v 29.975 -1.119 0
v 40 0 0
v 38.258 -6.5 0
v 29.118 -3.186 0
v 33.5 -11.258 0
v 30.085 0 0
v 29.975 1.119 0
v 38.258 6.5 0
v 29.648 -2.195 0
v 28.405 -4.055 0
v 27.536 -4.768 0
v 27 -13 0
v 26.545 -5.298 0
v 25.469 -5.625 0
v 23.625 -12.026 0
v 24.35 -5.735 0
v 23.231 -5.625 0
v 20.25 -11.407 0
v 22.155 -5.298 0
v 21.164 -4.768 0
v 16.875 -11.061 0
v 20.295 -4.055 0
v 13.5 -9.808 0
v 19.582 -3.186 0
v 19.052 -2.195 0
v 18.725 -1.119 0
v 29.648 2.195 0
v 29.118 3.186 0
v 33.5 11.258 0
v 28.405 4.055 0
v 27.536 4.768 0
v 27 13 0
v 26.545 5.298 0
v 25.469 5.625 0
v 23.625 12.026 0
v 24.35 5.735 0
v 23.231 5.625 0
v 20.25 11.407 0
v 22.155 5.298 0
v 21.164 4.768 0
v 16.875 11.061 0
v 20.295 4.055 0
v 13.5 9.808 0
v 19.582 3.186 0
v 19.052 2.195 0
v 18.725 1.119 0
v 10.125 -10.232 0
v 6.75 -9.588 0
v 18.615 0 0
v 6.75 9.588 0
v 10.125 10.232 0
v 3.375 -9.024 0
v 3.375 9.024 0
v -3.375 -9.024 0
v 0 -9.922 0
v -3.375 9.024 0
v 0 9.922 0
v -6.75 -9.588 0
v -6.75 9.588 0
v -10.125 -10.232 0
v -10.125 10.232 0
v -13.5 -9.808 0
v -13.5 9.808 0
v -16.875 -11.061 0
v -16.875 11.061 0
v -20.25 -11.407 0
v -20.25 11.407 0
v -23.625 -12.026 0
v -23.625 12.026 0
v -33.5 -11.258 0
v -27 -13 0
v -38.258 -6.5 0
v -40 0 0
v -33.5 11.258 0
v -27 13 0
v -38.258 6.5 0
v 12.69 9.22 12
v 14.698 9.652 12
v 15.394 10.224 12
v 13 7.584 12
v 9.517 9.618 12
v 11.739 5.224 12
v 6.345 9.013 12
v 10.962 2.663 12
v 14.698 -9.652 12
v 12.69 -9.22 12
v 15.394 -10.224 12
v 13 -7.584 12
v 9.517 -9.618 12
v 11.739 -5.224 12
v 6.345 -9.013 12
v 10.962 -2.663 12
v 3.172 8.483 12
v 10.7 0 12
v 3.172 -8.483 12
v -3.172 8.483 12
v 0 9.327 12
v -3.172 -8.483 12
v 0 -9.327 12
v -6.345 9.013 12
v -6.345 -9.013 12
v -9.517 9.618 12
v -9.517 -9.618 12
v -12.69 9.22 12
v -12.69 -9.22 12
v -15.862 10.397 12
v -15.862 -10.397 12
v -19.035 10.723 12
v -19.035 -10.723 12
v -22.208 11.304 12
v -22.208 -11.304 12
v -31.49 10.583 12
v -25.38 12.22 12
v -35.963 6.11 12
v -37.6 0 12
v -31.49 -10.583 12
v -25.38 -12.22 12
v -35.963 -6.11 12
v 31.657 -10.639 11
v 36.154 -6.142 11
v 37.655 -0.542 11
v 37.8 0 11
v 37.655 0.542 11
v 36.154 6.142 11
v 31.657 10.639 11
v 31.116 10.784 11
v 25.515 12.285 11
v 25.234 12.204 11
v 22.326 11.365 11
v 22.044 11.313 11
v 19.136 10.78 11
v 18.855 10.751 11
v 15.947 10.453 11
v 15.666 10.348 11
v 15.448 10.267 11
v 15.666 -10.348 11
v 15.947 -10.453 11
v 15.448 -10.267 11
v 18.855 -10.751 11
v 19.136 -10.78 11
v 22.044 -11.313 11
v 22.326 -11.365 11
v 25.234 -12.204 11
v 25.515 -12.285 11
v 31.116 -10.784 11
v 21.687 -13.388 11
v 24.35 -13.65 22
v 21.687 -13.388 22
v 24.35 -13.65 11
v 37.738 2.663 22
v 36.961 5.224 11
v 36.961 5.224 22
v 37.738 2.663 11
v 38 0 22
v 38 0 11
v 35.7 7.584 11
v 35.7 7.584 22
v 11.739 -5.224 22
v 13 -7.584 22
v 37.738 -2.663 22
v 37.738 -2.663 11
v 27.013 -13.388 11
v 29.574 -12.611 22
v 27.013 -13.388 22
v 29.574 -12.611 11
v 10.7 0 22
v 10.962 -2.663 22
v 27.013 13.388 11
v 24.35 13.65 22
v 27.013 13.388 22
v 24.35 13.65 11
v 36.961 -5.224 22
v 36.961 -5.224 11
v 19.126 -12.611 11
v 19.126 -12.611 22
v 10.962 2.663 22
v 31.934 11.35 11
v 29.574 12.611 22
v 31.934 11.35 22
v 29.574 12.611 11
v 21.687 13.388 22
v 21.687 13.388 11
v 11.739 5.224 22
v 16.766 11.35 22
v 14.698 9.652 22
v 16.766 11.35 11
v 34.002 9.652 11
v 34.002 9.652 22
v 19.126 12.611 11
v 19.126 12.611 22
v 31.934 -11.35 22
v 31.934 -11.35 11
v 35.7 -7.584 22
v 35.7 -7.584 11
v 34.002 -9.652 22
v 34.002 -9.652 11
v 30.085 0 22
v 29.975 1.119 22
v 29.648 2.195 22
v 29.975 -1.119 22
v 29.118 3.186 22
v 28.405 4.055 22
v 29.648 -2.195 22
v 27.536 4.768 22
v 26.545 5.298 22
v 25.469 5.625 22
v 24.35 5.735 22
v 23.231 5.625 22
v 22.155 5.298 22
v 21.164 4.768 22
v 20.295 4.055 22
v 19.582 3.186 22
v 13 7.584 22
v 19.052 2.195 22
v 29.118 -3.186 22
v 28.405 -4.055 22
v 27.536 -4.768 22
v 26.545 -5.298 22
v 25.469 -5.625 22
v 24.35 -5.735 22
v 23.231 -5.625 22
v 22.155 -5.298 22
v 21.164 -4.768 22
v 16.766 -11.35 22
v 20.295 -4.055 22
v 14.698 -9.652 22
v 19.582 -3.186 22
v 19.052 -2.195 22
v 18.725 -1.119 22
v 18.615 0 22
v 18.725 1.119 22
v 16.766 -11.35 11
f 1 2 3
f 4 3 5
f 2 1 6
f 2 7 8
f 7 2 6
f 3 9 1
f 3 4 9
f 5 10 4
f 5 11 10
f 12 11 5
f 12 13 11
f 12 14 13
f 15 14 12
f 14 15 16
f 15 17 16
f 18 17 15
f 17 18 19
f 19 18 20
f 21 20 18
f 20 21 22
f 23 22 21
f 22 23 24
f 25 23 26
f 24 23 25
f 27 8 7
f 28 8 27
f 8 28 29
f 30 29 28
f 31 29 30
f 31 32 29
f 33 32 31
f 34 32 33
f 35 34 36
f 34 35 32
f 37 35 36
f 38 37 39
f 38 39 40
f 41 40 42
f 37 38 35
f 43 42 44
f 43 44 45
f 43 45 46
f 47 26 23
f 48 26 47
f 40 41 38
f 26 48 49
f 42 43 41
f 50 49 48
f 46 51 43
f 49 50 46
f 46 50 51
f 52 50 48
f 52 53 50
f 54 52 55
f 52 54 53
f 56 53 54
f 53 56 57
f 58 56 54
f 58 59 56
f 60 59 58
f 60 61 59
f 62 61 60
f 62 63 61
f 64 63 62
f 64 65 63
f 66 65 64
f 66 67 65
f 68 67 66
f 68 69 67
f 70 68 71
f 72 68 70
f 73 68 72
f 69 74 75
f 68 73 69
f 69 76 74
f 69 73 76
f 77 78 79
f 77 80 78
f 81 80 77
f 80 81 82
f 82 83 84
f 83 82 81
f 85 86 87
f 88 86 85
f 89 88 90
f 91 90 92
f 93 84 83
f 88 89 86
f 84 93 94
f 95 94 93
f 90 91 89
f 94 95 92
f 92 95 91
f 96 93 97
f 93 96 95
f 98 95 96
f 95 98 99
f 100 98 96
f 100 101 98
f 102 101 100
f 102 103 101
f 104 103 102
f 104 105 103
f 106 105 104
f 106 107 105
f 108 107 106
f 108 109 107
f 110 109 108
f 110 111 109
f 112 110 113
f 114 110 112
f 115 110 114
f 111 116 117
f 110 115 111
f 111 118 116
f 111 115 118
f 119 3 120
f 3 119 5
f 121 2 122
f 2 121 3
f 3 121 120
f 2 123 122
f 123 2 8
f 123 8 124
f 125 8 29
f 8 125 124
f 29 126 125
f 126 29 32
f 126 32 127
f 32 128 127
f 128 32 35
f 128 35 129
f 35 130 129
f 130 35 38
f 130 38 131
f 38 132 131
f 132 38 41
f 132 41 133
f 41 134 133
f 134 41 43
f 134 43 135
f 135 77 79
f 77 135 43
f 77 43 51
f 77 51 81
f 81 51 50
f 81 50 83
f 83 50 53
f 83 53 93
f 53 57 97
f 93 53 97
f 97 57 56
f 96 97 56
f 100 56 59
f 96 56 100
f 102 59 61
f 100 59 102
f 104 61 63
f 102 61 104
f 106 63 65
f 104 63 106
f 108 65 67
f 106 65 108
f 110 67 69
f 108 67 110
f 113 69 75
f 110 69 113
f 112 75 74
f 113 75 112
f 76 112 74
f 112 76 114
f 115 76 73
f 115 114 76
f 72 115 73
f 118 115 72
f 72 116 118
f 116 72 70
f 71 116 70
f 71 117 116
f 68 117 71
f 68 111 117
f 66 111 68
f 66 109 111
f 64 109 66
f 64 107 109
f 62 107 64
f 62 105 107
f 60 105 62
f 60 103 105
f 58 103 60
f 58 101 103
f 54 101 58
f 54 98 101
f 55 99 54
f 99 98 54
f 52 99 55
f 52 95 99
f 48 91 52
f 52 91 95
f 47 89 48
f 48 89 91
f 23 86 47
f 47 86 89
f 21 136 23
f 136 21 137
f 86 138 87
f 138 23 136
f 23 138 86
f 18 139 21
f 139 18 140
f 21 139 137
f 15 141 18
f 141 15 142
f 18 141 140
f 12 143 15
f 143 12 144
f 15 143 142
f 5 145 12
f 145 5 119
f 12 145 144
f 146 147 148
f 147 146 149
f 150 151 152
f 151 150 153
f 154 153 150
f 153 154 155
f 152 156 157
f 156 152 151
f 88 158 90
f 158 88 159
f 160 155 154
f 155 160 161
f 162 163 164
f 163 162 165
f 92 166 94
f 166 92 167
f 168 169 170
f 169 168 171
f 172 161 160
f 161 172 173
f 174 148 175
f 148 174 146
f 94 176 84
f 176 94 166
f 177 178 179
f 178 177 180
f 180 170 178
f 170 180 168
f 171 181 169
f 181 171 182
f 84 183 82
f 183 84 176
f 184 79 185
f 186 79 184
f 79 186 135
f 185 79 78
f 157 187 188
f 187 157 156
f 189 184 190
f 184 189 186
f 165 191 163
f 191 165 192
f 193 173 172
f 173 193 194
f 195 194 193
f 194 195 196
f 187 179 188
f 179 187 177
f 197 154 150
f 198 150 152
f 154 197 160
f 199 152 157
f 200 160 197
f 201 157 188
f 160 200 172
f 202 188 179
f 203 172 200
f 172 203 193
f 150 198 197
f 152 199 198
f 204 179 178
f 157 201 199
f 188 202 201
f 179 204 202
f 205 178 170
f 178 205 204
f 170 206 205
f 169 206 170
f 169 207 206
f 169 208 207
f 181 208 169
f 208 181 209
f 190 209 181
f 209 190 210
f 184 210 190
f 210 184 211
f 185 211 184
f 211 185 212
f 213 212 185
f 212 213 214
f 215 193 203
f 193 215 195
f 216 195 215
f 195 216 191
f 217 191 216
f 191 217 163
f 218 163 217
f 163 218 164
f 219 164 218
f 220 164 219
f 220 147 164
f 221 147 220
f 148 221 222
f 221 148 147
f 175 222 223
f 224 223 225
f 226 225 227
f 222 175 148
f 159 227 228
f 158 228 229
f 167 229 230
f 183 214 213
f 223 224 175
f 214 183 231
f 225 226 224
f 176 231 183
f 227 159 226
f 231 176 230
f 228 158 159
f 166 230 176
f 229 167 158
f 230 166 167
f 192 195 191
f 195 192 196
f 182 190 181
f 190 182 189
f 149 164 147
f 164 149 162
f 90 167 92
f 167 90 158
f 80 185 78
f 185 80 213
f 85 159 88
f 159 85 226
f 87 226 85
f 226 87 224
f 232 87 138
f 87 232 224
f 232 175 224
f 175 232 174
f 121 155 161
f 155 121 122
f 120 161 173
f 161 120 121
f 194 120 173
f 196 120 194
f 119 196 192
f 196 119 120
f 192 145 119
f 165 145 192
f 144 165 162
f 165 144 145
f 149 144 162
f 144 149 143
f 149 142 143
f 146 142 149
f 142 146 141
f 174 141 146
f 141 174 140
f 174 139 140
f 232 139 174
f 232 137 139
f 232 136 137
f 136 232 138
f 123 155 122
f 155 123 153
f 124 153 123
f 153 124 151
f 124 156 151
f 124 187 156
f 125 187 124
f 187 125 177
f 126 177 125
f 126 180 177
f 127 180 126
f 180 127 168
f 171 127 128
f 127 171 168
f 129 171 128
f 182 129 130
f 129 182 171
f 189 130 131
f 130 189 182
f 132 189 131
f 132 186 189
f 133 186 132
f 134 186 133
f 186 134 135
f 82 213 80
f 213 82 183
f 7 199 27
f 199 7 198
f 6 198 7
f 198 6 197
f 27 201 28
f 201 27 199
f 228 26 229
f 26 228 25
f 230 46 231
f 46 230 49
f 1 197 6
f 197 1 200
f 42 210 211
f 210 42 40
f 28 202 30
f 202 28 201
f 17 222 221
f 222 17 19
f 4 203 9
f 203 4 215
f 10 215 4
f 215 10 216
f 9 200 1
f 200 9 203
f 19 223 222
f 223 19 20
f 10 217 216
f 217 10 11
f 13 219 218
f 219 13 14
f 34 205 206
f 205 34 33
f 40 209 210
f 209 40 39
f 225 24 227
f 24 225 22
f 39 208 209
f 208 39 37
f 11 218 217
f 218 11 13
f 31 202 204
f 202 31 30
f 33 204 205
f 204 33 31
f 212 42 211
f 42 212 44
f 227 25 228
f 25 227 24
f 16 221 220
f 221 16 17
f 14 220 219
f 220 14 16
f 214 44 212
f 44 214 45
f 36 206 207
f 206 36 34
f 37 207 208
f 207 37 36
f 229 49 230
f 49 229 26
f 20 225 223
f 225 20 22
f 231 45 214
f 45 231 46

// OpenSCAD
$fn = 32;

// ----------------------------------------------------------------------
// Handle: 80 x 26 mm grip, 12 mm thick
// ----------------------------------------------------------------------

// --- parameters (mm) ---
length = 80;              // grip length
width = 26;               // grip width
thickness = 12;           // grip thickness
waist = 0.72;             // width factor at the middle
draft = 0.94;             // top face scale of the extrusion
scallops = 6;             // finger rests per side
ripple = 0.06;            // depth factor of the finger rests
boss_d = 27.3;            // mounting boss diameter
boss_h = 10;              // mounting boss height
boss_hole_d = 11.47;      // screw clearance through the boss
boss_r = 24.35;           // boss centre from the grip centre

/* ergonomic grip outline, closed spline-like polygon in the XY plane */
grip = [[-27, 13], [-23.625, 12.026], [-20.25, 11.407], [-16.875, 11.061], [-13.5, 9.808], [-10.125, 10.232], [-6.75, 9.588], [-3.375, 9.024], [0, 9.922], [3.375, 9.024], [6.75, 9.588], [10.125, 10.232], [13.5, 9.808], [16.875, 11.061], [20.25, 11.407], [23.625, 12.026], [27, 13], [33.5, 11.258], [38.258, 6.5], [40, 0], [38.258, -6.5], [33.5, -11.258], [27, -13], [27, -13], [23.625, -12.026], [20.25, -11.407], [16.875, -11.061], [13.5, -9.808], [10.125, -10.232], [6.75, -9.588], [3.375, -9.024], [0, -9.922], [-3.375, -9.024], [-6.75, -9.588], [-10.125, -10.232], [-13.5, -9.808], [-16.875, -11.061], [-20.25, -11.407], [-23.625, -12.026], [-27, -13], [-33.5, -11.258], [-38.258, -6.5], [-40, 0], [-38.258, 6.5], [-33.5, 11.258], [-27, 13]];

module grip_body() {
  linear_extrude(height = thickness, scale = draft) polygon(grip);
}

module boss_body() {
  /* sunk 1 mm into the grip so the joint overlaps */
  translate([boss_r, 0, thickness - 1]) cylinder(h = boss_h + 1, d = boss_d);
}

difference() {
  union() {
    grip_body();
    boss_body();
  }
  translate([boss_r, 0, -1]) cylinder(h = thickness + boss_h + 2, d = boss_hole_d);
}
